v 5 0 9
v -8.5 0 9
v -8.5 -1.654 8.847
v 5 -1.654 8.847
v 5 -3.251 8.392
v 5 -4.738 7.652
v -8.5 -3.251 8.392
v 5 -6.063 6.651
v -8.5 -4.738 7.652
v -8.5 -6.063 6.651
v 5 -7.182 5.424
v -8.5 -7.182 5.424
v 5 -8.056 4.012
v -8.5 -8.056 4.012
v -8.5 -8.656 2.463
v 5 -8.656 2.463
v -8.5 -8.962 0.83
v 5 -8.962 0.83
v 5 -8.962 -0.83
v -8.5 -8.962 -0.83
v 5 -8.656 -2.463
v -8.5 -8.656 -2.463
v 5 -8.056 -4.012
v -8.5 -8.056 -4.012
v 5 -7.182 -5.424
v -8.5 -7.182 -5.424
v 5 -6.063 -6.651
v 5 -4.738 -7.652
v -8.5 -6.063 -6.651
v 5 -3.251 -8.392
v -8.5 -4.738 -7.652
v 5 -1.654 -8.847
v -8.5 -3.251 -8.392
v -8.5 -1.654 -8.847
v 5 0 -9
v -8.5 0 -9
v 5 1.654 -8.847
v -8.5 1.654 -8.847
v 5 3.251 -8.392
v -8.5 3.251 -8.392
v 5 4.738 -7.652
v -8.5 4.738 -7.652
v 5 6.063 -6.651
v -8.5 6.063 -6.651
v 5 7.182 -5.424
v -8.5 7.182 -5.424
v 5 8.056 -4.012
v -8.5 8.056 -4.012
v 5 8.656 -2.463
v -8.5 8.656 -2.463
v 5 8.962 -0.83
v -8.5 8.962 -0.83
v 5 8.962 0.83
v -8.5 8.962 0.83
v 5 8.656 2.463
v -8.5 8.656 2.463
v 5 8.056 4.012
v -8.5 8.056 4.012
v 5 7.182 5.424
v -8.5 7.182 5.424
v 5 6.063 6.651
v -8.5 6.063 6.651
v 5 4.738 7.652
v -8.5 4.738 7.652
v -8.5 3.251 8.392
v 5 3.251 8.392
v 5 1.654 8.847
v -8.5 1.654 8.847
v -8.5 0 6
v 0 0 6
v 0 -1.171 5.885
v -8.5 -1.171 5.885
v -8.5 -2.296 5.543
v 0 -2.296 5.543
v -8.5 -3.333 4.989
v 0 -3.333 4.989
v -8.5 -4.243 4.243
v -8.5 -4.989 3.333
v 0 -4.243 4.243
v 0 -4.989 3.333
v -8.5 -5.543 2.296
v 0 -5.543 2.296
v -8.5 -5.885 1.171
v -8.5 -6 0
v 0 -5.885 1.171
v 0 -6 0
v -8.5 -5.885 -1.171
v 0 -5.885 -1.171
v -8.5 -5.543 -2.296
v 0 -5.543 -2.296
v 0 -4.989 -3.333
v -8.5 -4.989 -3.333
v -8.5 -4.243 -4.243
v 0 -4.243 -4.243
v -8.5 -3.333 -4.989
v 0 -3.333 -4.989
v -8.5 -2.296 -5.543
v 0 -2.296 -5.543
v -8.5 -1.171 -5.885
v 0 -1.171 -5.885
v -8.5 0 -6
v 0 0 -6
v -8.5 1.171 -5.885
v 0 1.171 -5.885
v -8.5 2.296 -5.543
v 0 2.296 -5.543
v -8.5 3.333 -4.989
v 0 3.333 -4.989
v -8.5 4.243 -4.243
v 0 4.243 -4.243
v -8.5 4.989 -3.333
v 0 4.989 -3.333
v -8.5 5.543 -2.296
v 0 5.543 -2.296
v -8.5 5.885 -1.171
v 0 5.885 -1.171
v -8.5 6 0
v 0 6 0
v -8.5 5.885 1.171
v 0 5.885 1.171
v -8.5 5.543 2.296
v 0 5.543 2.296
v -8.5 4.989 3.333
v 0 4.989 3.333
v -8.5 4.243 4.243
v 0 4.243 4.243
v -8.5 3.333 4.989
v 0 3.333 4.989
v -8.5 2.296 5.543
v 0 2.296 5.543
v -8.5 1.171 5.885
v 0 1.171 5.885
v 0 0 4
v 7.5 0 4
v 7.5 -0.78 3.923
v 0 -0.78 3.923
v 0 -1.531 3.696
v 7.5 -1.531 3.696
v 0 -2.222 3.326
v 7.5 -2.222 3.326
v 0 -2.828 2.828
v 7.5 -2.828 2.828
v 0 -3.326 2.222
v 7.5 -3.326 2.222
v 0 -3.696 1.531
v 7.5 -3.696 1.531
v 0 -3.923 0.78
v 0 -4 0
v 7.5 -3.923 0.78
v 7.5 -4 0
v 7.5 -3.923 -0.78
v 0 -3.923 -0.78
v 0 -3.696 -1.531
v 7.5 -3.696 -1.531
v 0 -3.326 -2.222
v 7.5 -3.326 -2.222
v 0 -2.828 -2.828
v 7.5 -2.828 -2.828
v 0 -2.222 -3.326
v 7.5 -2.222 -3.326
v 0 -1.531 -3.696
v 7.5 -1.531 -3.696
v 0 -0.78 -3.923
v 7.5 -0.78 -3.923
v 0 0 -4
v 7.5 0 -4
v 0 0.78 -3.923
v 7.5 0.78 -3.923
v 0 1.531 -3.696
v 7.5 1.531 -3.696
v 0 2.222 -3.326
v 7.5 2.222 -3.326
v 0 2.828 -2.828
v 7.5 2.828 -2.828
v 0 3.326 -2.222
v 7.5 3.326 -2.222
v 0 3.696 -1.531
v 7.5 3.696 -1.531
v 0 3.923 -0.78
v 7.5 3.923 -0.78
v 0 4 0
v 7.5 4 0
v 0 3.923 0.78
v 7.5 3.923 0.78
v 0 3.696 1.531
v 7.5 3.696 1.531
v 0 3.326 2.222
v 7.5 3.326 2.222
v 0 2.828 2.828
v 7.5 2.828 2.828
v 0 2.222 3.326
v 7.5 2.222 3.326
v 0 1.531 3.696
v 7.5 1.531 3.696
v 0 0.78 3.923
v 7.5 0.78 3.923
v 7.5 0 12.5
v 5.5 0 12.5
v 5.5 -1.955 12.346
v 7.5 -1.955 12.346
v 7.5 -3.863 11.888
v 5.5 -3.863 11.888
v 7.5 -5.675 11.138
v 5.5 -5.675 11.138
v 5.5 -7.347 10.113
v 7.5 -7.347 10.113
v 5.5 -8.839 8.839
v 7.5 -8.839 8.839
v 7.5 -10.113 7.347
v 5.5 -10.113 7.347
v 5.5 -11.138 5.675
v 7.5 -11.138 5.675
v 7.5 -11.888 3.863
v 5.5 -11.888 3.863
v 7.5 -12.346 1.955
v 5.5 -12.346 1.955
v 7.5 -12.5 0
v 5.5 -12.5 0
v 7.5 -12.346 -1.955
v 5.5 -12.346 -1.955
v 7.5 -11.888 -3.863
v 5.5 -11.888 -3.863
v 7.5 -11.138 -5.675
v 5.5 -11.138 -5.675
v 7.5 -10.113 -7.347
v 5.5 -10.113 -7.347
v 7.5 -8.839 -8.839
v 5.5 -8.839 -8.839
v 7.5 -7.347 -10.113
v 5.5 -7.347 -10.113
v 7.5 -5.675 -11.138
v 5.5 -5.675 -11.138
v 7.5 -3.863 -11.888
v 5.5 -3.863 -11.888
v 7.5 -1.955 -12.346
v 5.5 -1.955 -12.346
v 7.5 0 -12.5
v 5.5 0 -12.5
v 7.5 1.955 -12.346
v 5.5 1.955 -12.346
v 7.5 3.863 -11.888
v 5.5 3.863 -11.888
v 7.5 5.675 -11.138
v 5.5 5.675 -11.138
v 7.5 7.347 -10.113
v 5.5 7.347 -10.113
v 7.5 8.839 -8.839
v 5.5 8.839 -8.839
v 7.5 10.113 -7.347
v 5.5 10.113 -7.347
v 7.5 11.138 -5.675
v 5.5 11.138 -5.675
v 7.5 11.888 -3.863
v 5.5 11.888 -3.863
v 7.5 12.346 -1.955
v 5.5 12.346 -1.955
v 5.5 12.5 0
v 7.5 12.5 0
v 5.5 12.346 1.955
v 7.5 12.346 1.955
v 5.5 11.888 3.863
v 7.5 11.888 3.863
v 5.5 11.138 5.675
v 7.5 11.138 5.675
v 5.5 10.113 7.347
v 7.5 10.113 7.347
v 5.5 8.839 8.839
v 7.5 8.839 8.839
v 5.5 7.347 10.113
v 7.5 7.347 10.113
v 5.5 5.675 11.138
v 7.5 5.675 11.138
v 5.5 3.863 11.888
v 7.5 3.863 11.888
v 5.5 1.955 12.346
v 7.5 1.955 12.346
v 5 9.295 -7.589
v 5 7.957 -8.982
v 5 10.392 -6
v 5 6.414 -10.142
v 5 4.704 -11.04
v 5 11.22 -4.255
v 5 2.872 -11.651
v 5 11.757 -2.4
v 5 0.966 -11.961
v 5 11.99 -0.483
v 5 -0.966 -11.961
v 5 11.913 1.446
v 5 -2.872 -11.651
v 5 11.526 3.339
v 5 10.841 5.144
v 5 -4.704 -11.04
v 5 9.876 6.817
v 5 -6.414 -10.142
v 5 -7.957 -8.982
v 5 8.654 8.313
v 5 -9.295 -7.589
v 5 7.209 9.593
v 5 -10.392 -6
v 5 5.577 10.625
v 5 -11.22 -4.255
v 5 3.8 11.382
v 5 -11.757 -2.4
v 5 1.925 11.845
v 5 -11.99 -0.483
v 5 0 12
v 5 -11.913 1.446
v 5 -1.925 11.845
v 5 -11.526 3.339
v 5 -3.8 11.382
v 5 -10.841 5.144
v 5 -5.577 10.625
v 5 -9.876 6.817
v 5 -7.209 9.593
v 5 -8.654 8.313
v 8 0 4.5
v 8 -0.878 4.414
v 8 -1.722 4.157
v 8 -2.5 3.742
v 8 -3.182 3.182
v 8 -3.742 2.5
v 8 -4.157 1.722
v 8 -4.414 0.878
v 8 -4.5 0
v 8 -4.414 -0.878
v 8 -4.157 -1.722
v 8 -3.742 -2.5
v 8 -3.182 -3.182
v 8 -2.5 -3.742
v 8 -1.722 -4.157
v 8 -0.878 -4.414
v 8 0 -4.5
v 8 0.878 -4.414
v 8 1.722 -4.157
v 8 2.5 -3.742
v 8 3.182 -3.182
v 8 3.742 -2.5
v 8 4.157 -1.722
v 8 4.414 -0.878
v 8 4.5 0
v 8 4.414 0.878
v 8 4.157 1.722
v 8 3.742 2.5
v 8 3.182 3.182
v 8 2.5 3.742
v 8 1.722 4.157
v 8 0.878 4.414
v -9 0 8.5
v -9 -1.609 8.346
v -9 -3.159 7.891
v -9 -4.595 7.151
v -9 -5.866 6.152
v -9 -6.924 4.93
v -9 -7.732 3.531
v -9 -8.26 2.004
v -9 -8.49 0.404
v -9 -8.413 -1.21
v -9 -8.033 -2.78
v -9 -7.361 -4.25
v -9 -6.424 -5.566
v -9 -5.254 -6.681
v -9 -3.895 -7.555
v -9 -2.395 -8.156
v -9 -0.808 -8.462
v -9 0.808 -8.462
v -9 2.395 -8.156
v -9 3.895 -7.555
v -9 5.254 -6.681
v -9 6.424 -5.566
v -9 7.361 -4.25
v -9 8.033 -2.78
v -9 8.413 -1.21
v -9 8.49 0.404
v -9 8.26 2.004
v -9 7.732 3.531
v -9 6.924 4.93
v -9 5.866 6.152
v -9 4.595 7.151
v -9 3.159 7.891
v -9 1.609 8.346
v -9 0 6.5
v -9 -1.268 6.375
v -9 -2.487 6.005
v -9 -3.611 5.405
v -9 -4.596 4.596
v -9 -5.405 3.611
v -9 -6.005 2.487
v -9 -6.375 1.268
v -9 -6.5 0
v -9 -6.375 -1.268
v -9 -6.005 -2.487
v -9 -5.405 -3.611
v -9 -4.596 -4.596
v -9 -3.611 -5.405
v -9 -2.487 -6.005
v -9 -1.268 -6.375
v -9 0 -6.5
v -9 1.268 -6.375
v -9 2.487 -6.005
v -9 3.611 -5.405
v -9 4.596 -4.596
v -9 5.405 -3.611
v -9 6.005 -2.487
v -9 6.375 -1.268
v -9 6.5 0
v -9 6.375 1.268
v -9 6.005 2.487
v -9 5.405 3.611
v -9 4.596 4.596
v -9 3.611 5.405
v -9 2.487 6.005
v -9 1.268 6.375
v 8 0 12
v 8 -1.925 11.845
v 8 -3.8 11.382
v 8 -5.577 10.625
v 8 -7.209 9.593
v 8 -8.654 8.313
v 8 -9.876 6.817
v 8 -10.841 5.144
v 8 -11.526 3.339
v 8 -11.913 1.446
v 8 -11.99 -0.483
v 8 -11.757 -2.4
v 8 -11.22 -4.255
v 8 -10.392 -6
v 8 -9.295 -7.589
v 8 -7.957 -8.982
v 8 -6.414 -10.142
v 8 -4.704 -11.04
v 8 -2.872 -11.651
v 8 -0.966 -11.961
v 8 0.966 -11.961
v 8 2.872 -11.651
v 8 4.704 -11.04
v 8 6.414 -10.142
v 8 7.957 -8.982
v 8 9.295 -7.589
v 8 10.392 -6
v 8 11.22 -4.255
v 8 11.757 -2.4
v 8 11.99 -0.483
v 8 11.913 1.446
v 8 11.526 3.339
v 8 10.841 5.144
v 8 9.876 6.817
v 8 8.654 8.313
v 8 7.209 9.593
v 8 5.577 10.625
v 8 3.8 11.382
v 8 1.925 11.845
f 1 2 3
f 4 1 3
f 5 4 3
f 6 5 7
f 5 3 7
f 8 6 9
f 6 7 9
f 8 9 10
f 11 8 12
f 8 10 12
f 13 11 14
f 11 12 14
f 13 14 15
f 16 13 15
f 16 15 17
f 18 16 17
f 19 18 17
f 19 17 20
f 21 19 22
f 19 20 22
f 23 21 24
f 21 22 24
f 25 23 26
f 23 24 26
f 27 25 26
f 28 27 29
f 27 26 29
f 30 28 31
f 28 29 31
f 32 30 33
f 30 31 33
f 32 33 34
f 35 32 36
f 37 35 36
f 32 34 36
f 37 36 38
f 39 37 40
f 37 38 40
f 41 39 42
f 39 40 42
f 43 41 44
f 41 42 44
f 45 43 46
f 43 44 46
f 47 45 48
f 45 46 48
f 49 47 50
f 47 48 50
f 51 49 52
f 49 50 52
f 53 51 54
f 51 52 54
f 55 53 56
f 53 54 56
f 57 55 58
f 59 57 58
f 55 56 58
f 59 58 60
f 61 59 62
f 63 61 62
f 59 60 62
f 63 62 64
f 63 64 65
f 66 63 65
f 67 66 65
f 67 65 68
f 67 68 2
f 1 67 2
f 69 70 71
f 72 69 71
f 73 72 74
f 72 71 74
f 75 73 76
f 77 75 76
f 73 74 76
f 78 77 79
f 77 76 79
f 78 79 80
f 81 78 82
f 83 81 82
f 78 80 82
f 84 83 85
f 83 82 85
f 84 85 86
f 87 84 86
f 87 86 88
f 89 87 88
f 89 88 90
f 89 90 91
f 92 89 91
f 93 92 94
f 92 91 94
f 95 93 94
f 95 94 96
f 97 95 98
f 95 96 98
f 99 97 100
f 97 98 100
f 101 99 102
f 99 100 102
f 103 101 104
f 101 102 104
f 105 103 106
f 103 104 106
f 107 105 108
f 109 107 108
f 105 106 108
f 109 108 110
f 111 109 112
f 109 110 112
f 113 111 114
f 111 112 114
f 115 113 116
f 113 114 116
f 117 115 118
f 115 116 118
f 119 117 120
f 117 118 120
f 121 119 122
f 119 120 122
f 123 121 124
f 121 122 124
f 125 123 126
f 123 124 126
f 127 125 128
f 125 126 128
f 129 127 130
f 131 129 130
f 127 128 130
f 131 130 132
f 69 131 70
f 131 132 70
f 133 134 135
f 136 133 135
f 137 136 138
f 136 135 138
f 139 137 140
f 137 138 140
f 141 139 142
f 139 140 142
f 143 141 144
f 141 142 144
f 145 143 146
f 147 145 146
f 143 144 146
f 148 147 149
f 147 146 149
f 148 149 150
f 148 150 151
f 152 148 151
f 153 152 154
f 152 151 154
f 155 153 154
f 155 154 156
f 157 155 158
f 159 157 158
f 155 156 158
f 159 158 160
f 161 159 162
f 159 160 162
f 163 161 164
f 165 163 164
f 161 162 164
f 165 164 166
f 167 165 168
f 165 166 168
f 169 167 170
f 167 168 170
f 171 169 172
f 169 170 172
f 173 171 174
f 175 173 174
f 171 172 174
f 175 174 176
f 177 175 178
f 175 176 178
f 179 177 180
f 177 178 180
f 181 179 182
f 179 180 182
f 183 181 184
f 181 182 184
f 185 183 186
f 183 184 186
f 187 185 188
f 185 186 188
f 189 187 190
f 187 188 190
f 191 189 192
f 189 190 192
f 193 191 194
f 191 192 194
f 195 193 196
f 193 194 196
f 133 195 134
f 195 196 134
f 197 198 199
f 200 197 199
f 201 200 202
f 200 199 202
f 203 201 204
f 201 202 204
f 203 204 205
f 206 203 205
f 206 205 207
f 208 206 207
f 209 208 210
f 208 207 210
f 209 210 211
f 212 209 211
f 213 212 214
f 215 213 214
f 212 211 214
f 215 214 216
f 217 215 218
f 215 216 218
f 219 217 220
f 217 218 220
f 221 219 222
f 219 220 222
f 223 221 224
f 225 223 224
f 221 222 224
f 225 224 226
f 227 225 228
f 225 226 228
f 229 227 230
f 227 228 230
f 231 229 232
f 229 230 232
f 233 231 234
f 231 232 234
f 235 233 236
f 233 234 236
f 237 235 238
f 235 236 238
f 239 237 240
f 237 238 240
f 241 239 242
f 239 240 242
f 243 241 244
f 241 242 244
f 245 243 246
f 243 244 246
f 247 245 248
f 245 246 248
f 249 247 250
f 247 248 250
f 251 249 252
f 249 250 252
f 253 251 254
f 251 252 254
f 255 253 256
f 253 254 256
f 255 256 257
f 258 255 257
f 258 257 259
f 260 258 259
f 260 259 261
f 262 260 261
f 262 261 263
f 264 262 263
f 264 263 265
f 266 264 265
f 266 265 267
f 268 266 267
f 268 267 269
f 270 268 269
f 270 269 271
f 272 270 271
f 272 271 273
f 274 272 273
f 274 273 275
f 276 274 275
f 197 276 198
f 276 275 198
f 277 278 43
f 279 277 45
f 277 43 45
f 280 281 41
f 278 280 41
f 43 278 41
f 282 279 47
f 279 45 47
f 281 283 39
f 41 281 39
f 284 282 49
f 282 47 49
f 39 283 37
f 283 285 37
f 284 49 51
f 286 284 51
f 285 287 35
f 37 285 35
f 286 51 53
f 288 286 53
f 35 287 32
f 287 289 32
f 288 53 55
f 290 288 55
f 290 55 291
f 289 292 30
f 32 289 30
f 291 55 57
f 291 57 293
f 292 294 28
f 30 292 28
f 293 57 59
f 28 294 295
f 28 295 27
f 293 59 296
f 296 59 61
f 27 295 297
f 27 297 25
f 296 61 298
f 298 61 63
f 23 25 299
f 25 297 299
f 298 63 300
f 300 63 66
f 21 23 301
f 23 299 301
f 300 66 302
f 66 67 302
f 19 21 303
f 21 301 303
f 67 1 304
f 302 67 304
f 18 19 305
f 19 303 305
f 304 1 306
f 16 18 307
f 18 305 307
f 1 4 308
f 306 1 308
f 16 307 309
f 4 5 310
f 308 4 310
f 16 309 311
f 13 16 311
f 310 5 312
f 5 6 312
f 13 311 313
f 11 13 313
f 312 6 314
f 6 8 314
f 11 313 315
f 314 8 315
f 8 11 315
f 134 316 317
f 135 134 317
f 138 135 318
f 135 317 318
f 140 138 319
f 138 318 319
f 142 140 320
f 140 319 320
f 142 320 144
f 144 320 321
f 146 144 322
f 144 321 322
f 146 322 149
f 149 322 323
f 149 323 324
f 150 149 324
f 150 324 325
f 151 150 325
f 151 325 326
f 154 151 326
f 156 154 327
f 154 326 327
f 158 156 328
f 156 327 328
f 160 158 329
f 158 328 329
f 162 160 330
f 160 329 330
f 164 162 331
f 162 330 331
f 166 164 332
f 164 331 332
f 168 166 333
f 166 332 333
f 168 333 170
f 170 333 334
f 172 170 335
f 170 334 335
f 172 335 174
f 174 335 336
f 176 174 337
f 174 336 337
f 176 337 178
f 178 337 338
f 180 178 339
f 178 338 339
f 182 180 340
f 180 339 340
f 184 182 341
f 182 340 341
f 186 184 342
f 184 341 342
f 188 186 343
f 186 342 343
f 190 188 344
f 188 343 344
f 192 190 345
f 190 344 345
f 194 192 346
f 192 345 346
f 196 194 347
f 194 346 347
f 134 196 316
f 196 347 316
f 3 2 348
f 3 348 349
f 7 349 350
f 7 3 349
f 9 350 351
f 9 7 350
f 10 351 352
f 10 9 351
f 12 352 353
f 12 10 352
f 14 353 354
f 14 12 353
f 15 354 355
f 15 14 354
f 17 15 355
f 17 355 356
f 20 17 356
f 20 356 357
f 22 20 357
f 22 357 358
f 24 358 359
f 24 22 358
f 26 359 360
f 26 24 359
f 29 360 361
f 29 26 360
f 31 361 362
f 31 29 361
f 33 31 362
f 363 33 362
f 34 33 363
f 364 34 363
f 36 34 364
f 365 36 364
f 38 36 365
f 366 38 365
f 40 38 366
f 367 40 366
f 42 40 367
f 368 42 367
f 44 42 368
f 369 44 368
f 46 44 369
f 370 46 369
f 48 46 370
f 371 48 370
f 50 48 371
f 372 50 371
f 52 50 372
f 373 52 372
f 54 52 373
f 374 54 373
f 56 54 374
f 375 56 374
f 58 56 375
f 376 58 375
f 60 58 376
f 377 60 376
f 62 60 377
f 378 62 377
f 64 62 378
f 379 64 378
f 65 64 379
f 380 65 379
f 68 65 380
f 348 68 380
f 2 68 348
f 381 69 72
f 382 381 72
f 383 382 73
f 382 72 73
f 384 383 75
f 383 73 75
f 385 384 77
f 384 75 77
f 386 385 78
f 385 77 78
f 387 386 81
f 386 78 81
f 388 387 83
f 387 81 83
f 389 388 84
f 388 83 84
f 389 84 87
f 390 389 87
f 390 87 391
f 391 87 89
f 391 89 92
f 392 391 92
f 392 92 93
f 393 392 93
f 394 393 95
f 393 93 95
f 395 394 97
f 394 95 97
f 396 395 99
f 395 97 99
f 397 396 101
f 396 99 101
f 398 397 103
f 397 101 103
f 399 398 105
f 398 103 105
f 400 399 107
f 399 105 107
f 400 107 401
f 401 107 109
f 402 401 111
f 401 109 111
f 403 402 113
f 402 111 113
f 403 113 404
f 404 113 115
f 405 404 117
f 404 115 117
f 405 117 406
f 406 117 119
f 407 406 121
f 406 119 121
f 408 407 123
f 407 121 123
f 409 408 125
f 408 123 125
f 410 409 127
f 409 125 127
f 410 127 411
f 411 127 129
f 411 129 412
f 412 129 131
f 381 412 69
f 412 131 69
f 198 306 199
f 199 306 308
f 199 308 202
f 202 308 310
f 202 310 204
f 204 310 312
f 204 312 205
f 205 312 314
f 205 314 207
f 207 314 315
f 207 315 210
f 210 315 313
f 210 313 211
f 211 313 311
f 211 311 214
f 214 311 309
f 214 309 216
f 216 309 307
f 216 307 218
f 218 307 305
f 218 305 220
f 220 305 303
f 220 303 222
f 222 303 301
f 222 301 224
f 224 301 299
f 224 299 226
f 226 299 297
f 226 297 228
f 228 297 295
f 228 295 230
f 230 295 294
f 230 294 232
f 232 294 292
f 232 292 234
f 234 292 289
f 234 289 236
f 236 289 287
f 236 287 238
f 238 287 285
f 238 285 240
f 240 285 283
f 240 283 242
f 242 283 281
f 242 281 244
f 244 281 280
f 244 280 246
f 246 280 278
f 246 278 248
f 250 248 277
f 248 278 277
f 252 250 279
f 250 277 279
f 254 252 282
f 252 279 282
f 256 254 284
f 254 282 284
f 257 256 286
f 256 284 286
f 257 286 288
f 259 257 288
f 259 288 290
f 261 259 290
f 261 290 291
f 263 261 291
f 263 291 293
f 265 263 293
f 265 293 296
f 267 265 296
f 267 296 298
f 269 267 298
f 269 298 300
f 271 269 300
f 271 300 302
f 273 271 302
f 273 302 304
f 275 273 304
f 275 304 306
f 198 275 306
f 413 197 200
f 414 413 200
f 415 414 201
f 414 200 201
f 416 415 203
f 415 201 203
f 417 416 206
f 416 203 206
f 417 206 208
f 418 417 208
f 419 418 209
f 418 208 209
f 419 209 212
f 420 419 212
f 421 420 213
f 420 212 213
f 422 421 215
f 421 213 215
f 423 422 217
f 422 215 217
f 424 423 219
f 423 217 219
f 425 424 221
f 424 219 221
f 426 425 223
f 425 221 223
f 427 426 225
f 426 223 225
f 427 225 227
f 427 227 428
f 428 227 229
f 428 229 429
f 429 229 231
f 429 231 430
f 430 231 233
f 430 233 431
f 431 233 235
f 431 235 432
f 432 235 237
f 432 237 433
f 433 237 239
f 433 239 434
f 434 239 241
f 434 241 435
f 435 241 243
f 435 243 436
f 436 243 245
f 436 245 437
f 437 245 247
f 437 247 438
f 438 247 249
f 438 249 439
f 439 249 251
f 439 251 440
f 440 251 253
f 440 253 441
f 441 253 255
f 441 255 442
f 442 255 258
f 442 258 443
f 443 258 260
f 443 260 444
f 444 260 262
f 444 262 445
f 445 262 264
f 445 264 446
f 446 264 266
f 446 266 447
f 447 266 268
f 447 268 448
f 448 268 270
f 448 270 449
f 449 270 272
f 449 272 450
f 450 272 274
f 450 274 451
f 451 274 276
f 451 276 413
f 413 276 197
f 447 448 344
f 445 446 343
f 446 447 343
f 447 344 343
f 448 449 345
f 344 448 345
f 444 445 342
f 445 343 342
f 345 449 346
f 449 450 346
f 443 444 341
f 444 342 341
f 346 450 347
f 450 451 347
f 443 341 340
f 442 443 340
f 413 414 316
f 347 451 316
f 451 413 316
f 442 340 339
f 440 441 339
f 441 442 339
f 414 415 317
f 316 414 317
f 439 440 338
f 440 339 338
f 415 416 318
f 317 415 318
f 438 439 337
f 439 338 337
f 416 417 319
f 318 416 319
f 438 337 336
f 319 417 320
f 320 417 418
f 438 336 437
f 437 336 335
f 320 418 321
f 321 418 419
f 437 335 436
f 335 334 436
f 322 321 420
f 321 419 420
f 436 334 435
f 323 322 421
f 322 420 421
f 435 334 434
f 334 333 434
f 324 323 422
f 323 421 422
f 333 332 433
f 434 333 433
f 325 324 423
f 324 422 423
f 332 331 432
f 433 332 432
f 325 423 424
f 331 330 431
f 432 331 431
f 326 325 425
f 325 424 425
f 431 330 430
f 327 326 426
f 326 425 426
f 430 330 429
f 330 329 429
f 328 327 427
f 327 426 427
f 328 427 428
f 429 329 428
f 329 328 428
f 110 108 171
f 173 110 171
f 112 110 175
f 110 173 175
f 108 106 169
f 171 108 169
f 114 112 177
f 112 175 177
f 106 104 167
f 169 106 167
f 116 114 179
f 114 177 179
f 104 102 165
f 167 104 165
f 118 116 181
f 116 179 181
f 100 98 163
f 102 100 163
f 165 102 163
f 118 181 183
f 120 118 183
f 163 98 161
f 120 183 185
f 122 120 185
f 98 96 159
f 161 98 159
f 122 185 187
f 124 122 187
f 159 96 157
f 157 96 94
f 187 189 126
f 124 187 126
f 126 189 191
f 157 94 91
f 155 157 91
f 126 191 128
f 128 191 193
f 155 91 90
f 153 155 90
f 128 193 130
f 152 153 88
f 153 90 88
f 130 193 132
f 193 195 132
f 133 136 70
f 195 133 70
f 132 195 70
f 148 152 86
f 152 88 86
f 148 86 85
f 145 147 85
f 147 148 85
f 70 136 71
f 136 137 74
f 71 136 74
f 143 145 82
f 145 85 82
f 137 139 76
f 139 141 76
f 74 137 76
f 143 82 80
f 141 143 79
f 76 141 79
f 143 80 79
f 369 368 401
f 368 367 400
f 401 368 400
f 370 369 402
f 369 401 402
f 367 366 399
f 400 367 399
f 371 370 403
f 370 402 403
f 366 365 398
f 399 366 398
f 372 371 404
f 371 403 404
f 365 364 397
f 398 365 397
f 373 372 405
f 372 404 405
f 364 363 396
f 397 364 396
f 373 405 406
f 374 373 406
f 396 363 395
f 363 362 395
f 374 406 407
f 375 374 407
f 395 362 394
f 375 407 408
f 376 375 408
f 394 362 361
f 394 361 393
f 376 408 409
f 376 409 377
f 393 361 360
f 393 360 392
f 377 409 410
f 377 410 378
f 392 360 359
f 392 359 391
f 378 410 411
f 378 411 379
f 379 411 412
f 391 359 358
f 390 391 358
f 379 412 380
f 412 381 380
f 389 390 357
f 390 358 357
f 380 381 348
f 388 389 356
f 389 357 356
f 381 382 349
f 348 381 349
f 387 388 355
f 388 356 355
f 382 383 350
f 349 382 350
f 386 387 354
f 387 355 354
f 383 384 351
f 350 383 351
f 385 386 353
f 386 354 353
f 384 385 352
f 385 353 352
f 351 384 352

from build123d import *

# Parameters (mm, degrees)
F1_SIZE = 0.5


with BuildPart() as f2:
    # F0 (on Front) → F2 (revolve)
    with BuildSketch(Plane.XZ):
        Polygon((-9, 9), (-9, 6), (0, 6), (0, 4), (8, 4), (8, 12.5), (5, 12.5), (5, 9), align=None)
    revolve(axis=Axis((0.124688, 0, 0), (1, 0, 0)))

    # F1
    f1_edges = [f2.edges().sort_by_distance(p)[0] for p in [
        (-9, 0, -6),
        (-9, 0, -9),
        (5, 0, -12.5),
        (8, 0, -12.5),
        (8, 0, -4),
    ]]
    chamfer(f1_edges, length=F1_SIZE)


solid = f2.part
